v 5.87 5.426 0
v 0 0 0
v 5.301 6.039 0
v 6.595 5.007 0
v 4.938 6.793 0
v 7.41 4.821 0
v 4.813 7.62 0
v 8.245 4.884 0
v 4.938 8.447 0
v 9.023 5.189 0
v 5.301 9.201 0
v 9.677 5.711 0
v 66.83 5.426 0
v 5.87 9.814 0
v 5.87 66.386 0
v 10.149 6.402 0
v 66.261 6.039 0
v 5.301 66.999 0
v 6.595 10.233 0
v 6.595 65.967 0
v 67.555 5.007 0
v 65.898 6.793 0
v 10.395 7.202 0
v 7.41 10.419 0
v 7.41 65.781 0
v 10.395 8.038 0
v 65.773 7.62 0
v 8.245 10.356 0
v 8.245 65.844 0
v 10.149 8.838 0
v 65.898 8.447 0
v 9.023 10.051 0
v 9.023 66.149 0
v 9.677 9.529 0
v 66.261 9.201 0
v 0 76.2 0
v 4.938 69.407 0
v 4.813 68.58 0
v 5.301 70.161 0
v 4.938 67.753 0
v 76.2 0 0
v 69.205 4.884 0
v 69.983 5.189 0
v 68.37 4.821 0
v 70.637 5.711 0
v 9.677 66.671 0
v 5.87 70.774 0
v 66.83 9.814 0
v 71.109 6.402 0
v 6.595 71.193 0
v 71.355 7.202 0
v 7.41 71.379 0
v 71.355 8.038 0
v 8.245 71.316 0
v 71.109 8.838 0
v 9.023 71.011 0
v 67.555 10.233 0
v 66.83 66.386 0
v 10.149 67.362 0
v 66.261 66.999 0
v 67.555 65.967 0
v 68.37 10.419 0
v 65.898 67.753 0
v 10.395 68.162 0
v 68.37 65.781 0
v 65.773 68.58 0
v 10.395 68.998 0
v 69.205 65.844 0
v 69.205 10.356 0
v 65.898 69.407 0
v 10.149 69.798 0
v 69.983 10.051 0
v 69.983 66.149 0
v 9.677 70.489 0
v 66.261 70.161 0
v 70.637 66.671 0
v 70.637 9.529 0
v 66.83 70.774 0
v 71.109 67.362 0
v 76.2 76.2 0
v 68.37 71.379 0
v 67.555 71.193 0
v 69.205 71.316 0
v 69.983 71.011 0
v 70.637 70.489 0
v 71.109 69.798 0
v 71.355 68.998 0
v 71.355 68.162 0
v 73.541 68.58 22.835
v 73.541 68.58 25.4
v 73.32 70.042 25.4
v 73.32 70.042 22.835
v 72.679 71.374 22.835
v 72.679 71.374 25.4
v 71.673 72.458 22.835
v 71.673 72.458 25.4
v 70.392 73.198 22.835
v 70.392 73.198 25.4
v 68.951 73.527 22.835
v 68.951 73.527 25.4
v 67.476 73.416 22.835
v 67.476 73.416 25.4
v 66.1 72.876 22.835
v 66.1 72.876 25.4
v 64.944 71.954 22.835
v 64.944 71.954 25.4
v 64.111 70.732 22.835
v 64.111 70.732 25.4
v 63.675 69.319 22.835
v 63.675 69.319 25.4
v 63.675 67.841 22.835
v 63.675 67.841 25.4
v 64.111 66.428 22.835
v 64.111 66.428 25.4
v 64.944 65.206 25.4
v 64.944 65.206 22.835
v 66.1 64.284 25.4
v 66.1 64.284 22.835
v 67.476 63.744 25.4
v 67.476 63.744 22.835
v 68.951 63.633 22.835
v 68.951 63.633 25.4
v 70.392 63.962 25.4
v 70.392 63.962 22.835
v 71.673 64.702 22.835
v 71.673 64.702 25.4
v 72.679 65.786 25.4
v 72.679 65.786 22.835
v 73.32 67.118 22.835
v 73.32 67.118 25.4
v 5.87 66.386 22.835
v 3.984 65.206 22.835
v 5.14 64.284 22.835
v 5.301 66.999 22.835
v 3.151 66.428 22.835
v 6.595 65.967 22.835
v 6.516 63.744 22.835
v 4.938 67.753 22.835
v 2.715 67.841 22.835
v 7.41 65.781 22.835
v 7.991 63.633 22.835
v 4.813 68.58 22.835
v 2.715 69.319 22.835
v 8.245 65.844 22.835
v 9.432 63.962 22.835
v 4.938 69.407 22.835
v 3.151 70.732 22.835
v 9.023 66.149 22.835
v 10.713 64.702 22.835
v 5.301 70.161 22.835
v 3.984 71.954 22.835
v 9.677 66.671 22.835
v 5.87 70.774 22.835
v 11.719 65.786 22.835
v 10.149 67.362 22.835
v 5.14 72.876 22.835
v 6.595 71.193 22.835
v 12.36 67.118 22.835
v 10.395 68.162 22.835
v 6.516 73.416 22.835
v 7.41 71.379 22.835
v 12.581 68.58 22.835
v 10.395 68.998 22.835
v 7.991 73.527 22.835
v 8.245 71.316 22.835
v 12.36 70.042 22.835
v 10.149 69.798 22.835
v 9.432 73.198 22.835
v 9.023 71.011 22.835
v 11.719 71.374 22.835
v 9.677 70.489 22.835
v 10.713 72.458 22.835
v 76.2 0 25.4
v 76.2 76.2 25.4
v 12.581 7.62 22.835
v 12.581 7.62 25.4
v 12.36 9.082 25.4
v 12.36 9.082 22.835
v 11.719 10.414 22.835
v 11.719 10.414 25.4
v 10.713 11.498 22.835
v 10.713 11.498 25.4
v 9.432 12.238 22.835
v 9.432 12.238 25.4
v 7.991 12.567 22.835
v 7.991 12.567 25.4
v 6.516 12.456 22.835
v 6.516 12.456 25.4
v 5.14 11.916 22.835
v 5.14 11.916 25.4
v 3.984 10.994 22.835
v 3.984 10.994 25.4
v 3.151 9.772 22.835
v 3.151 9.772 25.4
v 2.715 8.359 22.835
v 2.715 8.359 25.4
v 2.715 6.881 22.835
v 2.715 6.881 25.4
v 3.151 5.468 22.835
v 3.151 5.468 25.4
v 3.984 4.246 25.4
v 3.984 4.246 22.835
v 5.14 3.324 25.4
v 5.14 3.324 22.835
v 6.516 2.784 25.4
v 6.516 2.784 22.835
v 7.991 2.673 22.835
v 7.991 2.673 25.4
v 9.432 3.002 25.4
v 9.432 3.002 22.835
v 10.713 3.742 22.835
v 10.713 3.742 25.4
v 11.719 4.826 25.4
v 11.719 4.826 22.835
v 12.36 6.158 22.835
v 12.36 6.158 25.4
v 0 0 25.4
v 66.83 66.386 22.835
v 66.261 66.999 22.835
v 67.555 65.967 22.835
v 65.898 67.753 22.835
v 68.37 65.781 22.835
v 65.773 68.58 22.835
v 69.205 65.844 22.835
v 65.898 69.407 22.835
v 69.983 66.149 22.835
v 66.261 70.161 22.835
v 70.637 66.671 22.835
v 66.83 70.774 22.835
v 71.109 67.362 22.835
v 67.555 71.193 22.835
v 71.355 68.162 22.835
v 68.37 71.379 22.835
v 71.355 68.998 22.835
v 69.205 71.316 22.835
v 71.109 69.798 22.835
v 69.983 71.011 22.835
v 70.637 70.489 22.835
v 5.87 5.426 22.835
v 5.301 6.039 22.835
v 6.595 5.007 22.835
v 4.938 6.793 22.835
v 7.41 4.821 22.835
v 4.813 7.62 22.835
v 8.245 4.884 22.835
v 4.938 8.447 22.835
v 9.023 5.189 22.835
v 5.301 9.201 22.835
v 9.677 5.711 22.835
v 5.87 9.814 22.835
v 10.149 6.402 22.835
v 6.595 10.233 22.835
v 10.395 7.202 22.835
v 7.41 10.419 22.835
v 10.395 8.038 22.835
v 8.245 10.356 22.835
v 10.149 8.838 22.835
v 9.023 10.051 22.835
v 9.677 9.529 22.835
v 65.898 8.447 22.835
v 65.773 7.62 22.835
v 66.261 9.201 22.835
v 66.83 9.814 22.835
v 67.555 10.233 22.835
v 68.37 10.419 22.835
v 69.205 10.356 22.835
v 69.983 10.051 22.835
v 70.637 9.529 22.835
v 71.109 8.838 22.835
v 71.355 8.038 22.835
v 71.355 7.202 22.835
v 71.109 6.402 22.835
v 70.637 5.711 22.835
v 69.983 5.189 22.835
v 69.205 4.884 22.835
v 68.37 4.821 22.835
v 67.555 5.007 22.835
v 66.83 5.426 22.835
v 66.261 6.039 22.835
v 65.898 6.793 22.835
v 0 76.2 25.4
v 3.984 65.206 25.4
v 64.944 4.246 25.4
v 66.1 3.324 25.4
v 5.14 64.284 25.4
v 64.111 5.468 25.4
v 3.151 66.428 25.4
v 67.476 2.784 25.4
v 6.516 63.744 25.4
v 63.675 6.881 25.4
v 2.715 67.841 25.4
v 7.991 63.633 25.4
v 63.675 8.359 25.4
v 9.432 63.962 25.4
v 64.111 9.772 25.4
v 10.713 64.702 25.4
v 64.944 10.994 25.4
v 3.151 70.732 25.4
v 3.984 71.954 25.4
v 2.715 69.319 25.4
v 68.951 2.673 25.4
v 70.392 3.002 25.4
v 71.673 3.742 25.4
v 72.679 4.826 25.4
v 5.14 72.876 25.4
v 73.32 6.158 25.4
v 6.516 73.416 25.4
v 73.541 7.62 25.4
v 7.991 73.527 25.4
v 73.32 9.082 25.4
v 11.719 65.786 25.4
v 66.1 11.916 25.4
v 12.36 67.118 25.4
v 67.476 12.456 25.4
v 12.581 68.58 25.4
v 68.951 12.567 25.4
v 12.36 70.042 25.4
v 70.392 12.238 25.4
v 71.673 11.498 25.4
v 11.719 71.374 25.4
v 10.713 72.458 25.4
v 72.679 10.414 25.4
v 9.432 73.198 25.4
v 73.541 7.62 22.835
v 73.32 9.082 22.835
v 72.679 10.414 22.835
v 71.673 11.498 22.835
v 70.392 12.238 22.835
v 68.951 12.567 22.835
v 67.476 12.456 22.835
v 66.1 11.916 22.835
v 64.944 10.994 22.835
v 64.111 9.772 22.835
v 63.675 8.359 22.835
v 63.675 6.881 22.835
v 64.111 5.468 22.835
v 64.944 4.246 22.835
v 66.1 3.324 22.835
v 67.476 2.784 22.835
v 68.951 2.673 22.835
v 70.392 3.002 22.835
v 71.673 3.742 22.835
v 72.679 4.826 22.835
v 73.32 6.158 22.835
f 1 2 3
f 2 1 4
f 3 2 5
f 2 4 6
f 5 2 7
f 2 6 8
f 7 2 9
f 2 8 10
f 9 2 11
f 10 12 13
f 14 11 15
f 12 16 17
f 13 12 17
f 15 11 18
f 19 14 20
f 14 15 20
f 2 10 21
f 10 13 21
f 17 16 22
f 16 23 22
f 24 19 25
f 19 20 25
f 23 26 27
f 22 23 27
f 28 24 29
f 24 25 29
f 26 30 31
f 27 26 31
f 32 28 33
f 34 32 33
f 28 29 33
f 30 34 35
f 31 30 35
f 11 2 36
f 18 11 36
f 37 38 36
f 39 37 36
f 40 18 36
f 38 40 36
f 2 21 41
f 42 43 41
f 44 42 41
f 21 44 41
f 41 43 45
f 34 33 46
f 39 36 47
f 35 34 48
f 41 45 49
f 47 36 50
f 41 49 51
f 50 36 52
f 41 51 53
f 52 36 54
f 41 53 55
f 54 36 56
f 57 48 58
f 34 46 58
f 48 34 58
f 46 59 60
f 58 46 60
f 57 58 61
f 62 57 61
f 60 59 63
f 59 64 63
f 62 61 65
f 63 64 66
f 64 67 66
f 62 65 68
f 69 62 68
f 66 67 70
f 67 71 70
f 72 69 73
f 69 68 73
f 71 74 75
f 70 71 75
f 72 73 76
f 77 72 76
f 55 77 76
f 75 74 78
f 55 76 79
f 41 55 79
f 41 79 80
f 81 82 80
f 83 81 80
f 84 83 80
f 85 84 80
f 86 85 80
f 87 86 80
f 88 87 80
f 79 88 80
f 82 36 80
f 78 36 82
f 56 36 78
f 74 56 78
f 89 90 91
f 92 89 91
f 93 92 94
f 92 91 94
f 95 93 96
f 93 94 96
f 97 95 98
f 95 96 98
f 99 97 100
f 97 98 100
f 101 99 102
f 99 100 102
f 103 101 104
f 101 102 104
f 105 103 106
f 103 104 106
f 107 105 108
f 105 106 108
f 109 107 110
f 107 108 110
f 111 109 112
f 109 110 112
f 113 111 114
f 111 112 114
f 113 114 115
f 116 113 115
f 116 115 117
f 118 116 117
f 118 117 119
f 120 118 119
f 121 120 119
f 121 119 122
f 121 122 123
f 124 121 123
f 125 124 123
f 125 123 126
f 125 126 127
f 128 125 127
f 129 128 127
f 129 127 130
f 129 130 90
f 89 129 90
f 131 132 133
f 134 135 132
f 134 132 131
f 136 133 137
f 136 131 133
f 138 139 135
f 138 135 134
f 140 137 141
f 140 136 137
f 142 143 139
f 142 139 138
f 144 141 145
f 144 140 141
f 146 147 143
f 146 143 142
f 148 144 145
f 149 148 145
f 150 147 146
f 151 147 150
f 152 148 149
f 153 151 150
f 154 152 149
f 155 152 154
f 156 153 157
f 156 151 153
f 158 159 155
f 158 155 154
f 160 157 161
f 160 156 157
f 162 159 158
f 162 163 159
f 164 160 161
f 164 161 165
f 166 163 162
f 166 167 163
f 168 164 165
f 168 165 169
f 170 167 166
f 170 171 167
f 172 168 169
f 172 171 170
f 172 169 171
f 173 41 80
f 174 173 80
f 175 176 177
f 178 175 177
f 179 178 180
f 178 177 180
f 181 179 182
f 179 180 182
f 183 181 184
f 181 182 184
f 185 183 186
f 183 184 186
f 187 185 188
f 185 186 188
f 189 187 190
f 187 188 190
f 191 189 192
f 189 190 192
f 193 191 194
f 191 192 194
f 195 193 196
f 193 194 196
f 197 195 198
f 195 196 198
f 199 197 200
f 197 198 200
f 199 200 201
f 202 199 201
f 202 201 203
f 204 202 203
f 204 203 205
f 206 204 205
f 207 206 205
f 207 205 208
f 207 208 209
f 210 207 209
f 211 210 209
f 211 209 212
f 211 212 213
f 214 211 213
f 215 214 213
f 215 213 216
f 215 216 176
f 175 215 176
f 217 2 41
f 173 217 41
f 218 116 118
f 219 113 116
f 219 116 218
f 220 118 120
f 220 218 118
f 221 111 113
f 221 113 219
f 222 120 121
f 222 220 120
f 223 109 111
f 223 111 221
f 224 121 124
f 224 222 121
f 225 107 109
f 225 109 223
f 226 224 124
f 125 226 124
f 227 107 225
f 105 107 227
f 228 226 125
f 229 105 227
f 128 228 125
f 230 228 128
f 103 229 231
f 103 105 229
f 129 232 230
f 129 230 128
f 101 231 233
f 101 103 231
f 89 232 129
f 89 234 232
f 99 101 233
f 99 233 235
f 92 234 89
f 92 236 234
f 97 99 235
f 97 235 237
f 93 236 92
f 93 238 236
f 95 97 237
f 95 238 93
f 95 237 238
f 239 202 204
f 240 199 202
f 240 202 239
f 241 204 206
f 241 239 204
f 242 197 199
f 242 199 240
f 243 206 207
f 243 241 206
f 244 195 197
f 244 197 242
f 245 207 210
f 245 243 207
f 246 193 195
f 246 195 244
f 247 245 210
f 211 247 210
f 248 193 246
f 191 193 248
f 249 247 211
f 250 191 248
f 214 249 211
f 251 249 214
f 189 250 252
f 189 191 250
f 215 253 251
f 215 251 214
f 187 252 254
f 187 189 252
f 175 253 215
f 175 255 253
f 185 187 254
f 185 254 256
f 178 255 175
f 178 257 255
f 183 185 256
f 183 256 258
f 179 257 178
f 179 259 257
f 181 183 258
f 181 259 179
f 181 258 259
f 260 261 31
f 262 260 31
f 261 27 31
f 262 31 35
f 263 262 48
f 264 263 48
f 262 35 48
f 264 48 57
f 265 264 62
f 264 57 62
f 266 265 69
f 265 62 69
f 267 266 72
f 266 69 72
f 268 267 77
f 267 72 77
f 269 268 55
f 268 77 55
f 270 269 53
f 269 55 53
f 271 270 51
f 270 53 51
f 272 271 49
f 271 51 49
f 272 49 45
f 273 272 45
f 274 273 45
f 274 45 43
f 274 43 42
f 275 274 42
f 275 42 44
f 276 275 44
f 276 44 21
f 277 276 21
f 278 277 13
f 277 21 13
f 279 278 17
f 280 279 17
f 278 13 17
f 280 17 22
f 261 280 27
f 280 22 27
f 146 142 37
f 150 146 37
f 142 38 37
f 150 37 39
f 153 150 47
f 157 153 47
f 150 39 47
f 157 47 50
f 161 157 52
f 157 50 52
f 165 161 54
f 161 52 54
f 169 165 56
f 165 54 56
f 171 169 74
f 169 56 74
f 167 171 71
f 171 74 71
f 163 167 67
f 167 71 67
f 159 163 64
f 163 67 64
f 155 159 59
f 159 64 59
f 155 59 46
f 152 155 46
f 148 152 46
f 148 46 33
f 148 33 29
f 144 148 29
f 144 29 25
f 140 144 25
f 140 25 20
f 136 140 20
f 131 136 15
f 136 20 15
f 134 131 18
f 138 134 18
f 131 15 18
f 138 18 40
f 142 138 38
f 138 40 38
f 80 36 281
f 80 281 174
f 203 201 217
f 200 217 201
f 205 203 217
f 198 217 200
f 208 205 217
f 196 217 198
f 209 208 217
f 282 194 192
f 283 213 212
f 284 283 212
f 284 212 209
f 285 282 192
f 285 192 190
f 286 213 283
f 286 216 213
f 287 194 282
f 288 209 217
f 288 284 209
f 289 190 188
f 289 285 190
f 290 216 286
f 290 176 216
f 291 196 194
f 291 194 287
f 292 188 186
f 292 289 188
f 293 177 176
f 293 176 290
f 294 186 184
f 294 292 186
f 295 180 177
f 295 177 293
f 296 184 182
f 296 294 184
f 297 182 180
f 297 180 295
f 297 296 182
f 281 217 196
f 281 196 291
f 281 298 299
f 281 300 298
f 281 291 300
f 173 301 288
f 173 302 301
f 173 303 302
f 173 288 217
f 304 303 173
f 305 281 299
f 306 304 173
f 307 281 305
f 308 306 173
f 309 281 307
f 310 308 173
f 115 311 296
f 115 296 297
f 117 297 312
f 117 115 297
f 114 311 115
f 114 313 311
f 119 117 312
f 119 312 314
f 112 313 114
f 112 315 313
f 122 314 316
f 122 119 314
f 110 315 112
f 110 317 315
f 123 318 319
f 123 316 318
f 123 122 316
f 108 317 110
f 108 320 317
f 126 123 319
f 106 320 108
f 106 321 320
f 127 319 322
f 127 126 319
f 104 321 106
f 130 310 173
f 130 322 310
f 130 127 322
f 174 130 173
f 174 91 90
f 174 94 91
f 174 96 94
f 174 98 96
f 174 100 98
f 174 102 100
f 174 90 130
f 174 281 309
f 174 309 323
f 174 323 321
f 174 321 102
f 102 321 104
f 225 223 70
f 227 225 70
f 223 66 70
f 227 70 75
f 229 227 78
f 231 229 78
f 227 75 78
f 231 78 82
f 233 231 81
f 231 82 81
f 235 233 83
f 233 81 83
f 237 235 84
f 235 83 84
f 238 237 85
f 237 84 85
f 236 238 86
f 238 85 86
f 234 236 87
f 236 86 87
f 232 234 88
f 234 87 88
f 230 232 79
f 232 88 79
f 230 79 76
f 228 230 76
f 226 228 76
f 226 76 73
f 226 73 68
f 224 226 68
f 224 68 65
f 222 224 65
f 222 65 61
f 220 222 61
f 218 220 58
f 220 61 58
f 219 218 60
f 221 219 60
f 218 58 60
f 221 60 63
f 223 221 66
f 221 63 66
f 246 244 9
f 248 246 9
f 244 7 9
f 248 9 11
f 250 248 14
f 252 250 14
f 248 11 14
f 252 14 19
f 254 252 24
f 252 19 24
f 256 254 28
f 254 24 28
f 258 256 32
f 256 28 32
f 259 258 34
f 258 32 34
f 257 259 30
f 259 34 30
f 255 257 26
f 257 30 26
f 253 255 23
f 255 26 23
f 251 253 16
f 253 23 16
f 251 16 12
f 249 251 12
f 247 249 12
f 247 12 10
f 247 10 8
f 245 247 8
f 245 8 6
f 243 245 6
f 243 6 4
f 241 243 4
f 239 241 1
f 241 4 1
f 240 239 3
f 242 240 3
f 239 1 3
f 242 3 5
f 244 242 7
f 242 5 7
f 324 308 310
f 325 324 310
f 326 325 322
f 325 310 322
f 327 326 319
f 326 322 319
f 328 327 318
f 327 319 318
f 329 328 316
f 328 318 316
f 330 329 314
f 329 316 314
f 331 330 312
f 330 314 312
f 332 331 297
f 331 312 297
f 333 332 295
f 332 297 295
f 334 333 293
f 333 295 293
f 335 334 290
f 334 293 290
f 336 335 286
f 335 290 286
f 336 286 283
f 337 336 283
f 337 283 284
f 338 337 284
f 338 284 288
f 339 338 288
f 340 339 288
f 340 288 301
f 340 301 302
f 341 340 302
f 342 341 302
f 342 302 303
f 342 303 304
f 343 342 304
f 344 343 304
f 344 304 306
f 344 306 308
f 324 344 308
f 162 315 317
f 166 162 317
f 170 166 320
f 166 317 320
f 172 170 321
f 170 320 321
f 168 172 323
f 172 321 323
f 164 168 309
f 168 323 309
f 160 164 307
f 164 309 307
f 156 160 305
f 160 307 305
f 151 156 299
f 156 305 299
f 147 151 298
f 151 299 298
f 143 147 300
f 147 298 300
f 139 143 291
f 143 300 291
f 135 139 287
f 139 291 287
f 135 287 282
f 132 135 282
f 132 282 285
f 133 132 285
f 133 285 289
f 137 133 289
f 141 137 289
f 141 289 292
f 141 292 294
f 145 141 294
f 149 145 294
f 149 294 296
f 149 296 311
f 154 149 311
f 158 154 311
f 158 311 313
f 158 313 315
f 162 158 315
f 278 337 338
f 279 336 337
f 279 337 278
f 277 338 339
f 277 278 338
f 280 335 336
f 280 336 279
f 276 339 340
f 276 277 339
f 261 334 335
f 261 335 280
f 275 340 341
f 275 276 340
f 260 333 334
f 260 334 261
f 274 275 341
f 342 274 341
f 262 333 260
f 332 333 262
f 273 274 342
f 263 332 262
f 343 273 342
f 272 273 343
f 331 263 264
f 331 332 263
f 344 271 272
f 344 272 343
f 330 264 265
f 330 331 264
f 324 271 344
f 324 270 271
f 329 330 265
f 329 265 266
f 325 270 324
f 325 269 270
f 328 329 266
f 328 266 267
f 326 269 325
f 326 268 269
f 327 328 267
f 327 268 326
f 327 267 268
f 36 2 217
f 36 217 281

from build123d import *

# Parameters (mm, degrees)
SKETCH2_W                                       = 76.2
SKETCH2_H                                       = 76.2
BOSS_EXTRUDE1_DEPTH                             = 25.4
CBORE_FOR_10_BUTTON_HEAD_CAP_SCREW1_D           = 5.6134
CBORE_FOR_10_BUTTON_HEAD_CAP_SCREW1_CBORE_D     = 9.92124
CBORE_FOR_10_BUTTON_HEAD_CAP_SCREW1_CBORE_DEPTH = 2.5654


with BuildPart() as part:
    # Sketch2 → Boss-Extrude1 (new body)
    with BuildSketch(Plane.XY):
        with Locations((38.1, 38.1)):
            Rectangle(SKETCH2_W, SKETCH2_H)
    extrude(amount=BOSS_EXTRUDE1_DEPTH)

    # CBORE for #10 Button Head Cap Screw1 (through all)
    with Locations(Plane.XY.offset(25.4)):
        with Locations((7.62, 68.58), (68.58, 68.58), (68.58, 7.62), (7.62, 7.62)):
            CounterBoreHole(CBORE_FOR_10_BUTTON_HEAD_CAP_SCREW1_D / 2, CBORE_FOR_10_BUTTON_HEAD_CAP_SCREW1_CBORE_D / 2, CBORE_FOR_10_BUTTON_HEAD_CAP_SCREW1_CBORE_DEPTH)


solid = part.part
